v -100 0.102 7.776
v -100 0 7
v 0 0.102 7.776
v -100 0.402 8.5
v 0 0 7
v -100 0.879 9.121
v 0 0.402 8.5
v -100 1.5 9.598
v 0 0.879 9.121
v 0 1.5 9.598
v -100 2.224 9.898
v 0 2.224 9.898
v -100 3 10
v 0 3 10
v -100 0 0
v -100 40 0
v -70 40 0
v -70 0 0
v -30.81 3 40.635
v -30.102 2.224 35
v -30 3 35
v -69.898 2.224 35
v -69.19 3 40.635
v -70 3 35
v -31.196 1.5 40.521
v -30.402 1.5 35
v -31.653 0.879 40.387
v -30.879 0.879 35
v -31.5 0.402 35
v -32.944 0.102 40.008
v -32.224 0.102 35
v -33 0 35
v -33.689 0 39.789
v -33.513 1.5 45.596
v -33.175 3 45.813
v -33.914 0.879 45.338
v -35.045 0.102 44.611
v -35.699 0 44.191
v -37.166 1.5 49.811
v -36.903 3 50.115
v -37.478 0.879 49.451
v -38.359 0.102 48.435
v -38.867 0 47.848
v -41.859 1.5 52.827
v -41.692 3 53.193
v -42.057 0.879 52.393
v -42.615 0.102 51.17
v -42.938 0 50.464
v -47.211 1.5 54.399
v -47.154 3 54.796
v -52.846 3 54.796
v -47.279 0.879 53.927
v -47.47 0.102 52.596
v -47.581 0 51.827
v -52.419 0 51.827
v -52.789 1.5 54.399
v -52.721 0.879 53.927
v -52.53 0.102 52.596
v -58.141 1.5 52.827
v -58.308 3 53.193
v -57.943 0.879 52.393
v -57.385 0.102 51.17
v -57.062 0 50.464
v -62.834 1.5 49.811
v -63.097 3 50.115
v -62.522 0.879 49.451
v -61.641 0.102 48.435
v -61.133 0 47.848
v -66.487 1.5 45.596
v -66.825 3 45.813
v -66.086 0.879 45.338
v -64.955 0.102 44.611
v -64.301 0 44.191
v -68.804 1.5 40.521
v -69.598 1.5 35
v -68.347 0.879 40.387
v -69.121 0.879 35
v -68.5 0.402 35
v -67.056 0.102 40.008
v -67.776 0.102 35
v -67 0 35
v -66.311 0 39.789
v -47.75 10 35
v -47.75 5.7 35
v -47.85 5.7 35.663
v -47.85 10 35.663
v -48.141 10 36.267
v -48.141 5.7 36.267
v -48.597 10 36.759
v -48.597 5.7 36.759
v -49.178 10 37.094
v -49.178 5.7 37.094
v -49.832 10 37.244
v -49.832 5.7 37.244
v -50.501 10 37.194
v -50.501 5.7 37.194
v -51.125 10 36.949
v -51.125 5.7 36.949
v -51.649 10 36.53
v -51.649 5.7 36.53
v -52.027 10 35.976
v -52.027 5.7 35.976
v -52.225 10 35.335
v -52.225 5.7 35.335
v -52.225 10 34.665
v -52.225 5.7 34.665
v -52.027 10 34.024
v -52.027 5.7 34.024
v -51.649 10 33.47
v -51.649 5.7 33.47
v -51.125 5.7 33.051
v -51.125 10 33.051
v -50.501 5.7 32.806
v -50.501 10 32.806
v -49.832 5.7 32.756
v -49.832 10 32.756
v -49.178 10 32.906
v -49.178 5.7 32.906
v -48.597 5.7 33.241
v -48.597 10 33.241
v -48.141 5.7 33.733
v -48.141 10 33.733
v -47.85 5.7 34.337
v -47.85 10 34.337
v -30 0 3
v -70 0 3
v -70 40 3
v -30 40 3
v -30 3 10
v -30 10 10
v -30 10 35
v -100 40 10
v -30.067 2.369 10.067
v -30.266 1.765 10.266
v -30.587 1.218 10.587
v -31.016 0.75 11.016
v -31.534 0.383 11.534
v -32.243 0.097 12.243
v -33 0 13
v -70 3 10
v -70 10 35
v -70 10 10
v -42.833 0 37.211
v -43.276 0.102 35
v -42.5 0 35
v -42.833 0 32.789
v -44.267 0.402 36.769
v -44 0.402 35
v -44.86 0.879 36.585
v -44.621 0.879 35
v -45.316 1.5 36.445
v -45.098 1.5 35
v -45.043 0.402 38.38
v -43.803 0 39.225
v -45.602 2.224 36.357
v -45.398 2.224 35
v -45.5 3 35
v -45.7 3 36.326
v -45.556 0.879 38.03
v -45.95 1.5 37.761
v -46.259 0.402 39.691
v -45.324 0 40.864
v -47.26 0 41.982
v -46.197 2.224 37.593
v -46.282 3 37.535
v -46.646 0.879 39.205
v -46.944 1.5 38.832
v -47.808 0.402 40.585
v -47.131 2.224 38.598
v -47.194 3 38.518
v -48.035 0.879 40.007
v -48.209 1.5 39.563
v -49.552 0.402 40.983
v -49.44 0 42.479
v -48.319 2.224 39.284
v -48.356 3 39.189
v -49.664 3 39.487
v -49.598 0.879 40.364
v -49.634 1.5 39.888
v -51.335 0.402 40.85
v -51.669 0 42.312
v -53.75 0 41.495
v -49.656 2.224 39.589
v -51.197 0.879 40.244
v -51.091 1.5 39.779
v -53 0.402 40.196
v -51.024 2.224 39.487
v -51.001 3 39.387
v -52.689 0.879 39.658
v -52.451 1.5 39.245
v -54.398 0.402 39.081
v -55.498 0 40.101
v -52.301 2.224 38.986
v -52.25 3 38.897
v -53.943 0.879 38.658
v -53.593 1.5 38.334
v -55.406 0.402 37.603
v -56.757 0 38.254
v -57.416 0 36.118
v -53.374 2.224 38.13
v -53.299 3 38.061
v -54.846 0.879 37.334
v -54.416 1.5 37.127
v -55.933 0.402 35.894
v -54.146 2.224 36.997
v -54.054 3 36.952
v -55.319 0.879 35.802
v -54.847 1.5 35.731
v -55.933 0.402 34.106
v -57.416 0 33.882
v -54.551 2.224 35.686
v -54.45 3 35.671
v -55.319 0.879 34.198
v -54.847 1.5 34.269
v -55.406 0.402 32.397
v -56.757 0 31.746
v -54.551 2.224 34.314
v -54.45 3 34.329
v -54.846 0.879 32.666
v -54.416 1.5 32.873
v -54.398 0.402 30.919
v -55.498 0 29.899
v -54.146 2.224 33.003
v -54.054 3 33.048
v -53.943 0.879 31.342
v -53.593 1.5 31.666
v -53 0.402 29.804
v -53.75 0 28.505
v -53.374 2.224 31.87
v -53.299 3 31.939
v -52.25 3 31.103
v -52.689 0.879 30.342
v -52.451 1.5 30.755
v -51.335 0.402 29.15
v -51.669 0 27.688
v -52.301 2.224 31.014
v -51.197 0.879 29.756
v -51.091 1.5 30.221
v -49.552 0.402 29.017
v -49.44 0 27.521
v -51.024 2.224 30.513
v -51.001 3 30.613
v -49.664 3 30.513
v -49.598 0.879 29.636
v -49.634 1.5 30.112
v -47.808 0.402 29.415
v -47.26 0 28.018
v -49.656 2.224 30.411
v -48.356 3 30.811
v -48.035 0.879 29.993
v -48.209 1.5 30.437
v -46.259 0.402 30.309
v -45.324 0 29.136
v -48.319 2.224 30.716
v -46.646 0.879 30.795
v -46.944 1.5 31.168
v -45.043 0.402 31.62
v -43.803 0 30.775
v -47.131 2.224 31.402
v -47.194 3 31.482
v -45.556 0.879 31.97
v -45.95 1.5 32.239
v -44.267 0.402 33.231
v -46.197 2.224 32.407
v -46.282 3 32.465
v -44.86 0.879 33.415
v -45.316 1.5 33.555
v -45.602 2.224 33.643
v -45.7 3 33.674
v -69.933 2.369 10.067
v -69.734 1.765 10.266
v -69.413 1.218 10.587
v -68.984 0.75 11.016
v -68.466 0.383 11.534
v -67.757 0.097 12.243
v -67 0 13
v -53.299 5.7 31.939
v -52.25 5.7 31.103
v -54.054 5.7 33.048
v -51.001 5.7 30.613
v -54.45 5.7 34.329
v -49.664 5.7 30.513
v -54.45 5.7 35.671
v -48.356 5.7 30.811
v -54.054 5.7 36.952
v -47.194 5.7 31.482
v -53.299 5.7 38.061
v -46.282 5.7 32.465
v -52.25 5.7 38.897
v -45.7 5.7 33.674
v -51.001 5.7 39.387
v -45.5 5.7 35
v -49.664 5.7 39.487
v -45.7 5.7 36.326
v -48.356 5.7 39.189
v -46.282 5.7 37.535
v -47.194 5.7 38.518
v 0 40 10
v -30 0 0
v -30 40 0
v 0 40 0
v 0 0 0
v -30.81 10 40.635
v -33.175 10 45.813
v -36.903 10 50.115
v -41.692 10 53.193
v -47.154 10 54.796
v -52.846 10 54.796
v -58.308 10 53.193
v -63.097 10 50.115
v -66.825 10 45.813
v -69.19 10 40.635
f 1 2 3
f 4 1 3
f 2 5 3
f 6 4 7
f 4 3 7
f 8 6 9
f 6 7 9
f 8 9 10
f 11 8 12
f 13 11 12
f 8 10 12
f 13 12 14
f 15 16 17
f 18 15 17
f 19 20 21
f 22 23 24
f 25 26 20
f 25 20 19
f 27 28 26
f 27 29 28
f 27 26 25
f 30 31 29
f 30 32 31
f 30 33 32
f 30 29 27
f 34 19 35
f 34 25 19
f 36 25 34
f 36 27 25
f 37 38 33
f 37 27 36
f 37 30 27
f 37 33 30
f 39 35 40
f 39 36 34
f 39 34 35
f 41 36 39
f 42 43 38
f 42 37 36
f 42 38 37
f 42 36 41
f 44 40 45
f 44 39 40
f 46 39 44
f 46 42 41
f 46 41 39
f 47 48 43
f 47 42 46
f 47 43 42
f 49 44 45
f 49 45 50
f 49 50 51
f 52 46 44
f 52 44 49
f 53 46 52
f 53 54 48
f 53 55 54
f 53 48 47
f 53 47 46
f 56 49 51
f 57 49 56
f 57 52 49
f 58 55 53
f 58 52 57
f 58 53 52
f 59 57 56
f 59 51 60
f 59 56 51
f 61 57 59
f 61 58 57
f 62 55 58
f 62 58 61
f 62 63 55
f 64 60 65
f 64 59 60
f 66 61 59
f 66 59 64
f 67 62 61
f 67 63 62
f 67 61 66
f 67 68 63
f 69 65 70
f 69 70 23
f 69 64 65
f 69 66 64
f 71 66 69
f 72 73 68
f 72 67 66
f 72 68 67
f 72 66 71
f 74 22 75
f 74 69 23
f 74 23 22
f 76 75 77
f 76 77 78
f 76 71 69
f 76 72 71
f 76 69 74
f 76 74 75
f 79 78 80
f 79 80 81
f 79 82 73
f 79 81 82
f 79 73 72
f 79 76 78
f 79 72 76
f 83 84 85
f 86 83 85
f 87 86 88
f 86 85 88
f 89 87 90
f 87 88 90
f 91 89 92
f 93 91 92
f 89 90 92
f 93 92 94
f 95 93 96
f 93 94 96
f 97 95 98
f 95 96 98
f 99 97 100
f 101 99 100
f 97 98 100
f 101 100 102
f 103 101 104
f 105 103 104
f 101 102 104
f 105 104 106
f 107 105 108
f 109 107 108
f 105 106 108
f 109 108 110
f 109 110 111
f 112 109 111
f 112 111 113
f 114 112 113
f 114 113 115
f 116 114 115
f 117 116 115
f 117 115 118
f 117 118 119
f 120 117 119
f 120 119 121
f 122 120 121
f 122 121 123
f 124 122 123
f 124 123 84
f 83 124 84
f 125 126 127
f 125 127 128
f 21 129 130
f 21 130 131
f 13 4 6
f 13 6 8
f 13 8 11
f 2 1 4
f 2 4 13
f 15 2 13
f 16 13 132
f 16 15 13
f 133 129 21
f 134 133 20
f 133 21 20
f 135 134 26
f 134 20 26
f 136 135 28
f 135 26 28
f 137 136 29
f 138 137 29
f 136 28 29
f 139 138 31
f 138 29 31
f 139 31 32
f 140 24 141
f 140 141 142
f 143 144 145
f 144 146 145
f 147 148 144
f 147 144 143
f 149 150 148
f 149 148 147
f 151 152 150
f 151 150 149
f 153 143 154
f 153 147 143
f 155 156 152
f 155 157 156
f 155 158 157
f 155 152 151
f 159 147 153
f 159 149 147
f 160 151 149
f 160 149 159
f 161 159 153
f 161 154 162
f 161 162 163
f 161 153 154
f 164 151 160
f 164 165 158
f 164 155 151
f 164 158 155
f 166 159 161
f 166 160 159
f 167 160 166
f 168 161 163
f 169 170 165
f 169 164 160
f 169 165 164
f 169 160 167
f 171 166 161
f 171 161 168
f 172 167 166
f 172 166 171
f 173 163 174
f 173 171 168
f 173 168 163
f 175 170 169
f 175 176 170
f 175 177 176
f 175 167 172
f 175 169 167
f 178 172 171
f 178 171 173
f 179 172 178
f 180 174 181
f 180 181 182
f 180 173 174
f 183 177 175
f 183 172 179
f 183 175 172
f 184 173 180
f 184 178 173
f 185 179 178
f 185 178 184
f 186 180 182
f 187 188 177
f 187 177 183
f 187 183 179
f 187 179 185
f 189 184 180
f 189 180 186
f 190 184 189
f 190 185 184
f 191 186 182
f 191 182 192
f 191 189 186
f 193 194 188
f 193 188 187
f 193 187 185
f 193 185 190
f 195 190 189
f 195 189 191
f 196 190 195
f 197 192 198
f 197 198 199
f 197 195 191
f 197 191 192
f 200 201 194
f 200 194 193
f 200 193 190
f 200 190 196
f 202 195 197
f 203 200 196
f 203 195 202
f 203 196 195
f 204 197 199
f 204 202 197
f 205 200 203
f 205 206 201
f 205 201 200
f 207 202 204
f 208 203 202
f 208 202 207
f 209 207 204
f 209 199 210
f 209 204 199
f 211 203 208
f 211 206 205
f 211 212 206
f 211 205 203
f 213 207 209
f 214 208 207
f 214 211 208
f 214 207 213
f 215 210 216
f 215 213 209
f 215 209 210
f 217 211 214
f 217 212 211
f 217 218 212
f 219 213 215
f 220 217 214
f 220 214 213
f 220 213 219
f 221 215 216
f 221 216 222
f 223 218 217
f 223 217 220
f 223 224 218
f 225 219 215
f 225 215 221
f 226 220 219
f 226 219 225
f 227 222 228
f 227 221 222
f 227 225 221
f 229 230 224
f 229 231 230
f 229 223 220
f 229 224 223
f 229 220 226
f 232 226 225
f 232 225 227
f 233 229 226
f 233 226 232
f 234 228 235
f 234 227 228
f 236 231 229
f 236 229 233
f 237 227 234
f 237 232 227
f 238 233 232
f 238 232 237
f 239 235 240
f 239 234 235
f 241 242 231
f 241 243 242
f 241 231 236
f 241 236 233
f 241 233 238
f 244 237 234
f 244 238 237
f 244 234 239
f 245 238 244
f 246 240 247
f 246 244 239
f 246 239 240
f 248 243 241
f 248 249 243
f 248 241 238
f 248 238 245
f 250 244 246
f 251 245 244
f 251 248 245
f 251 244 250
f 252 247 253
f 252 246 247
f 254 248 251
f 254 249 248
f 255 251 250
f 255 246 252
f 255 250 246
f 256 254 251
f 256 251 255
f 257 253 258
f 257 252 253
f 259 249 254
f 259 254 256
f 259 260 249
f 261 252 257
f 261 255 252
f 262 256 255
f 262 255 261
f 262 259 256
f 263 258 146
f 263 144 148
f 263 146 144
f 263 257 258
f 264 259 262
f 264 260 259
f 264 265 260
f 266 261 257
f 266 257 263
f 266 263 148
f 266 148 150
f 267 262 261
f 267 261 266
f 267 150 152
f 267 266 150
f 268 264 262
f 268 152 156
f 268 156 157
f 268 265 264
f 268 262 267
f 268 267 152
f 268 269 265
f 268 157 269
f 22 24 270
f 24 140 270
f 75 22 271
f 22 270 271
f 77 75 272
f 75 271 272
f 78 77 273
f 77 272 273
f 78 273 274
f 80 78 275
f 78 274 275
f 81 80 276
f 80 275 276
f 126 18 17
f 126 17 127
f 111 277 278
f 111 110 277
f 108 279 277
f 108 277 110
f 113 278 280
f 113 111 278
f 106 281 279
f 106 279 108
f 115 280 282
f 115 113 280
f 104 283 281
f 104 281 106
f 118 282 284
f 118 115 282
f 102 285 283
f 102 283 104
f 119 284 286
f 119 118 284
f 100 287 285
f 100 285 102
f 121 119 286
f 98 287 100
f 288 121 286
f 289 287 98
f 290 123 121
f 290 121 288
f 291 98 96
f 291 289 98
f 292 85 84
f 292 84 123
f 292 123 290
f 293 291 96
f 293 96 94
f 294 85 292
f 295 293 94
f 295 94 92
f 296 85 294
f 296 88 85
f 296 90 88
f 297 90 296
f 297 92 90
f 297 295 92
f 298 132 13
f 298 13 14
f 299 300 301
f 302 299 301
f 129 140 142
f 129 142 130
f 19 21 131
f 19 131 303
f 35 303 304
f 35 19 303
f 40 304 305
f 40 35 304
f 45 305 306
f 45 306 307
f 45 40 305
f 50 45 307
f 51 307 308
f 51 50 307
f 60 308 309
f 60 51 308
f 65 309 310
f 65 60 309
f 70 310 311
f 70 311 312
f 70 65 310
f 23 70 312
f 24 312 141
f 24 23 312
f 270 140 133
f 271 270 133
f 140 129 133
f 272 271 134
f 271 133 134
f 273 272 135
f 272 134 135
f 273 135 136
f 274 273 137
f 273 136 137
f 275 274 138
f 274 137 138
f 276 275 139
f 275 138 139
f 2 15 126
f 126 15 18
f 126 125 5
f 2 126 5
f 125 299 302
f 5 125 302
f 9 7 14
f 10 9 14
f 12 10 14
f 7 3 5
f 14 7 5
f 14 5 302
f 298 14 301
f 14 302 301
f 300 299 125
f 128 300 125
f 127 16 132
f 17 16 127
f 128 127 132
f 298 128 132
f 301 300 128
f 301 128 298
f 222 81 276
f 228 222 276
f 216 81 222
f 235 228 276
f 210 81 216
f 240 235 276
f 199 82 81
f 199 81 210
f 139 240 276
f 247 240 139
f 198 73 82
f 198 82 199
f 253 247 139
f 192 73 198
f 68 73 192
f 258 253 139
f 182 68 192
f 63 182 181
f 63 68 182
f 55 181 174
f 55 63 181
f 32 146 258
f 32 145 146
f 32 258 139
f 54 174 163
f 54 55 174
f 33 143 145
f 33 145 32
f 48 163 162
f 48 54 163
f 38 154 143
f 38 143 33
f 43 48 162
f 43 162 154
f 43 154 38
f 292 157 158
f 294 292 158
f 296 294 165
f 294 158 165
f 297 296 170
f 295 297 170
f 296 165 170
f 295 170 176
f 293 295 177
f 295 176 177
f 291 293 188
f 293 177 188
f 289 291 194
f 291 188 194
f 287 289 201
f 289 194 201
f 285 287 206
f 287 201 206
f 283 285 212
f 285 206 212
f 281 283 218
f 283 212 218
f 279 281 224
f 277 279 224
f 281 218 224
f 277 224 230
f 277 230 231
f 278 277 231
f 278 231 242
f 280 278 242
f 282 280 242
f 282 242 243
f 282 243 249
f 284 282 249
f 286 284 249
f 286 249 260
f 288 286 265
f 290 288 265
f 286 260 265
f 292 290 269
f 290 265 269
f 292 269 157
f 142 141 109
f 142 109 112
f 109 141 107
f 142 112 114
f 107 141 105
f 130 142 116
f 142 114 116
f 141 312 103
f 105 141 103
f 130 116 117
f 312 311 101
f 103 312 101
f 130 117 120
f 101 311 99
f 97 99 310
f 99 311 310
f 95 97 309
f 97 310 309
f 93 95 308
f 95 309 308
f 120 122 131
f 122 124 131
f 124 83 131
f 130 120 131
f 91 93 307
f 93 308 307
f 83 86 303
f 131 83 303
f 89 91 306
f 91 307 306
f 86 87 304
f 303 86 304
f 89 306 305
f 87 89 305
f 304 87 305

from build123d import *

# Parameters (mm, degrees)
F0_W     = 100
F0_H     = 40
F1_DEPTH = 10
F3_DEPTH = 10
F4_W     = 40
F4_H     = 3
F5_DEPTH = 40.001
F6_R     = 2.25
F7_DEPTH = 40.001
F8_R     = 4.5
F9_DEPTH = 5.7
F10_R    = 3
F11_R    = 3


with BuildPart() as f1:
    # F0 (on Top) → F1 (new body)
    with BuildSketch(Plane.XY):
        with Locations((-50, 20)):
            Rectangle(F0_W, F0_H)
    extrude(amount=F1_DEPTH)

    # F4 (on face) → F5 (cut, through all)
    with BuildSketch(Plane.XZ):
        with Locations((-50, 1.5)):
            Rectangle(F4_W, F4_H)
    extrude(amount=-F5_DEPTH, mode=Mode.SUBTRACT)

    # F11
    f11_edges = [f1.edges().sort_by_distance(p)[0] for p in [
        (-50, 0, 10),
    ]]
    fillet(f11_edges, radius=F11_R)


with BuildPart() as f3:
    # F2 (on face) → F3 (new body)
    with BuildSketch(Plane.XZ):
        with BuildLine():
            Line((-70, 35), (-70, 10))
            Line((-70, 10), (-30, 10))
            Line((-30, 10), (-30, 35))
            ThreePointArc((-30, 35), (-50, 55), (-70, 35))
        make_face()
    extrude(amount=-F3_DEPTH)

    # F6 (on face) → F7 (cut, through all)
    with BuildSketch(Plane.XZ):
        with Locations((-50, 35)):
            Circle(F6_R)
    extrude(amount=-F7_DEPTH, mode=Mode.SUBTRACT)

    # F8 (on face) → F9 (cut)
    with BuildSketch(Plane.XZ):
        with Locations((-50, 35)):
            Circle(F8_R)
    extrude(amount=-F9_DEPTH, mode=Mode.SUBTRACT)

    # F10
    f10_edges = [f3.edges().sort_by_distance(p)[0] for p in [
        (-70, 0, 22.5),
        (-50, 0, 55),
        (-50, 0, 10),
        (-30, 0, 22.5),
        (-54.5, 0, 35),
    ]]
    fillet(f10_edges, radius=F10_R)


solid = Compound([f1.part, f3.part])
